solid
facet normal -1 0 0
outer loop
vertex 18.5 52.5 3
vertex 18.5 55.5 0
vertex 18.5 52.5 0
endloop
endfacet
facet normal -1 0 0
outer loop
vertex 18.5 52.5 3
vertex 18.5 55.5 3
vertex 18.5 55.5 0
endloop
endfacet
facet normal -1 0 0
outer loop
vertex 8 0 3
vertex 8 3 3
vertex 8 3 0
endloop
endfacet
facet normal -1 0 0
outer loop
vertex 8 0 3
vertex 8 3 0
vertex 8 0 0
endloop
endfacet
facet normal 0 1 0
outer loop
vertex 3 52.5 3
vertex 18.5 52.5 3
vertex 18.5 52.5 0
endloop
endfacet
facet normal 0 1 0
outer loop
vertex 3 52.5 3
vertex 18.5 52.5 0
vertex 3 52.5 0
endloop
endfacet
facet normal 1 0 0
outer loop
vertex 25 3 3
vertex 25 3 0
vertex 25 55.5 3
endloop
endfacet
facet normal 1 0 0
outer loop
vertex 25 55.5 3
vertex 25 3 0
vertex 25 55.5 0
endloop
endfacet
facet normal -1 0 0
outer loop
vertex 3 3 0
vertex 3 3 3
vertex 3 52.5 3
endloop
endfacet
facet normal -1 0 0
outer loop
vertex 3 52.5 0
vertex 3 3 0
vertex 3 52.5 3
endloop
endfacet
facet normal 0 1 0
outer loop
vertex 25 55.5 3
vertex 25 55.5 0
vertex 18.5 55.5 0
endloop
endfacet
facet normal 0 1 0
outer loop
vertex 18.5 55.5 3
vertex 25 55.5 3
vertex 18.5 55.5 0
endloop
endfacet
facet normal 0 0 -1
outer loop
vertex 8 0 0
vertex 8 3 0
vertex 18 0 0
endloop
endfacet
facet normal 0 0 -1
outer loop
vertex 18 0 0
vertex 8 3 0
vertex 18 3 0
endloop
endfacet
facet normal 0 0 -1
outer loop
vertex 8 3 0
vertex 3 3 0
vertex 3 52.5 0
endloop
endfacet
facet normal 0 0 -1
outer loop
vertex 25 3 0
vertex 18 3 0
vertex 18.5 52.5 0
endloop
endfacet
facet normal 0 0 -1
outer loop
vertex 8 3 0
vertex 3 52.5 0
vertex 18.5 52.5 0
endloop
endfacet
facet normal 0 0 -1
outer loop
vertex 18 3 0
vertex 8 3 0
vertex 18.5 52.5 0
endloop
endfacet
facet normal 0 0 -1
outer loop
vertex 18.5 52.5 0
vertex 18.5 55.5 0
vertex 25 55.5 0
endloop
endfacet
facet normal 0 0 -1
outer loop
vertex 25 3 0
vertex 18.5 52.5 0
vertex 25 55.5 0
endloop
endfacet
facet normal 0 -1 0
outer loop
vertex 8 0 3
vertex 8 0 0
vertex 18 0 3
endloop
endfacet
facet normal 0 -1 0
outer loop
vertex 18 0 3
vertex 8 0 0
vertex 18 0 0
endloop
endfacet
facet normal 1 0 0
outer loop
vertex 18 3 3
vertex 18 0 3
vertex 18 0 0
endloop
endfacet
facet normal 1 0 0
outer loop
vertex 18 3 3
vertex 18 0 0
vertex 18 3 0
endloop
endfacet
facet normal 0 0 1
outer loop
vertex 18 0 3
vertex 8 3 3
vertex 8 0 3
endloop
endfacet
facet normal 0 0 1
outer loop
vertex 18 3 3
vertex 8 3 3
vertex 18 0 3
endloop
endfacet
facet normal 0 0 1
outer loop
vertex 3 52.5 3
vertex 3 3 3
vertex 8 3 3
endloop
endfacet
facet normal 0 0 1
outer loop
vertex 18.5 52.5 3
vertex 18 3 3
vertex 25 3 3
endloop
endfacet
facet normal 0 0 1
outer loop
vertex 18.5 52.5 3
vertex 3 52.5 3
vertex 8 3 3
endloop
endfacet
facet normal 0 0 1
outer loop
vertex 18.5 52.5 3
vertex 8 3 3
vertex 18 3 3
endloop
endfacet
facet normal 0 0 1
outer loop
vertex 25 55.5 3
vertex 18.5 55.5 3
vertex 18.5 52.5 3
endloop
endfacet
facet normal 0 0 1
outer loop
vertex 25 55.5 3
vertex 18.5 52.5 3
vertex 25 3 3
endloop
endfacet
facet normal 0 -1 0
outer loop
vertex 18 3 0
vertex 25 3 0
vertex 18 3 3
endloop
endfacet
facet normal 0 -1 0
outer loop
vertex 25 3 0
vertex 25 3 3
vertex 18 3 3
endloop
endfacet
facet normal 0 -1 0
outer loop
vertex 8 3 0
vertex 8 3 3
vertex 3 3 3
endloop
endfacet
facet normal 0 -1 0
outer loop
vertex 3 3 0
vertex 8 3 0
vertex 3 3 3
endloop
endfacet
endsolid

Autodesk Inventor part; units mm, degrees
ref_plane "YZ Plane" through (0, 0, 0) normal (1, 0, 0) x (0, 1, 0)
ref_plane "XZ Plane" through (0, 0, 0) normal (0, 1, 0) x (-1, 0, 0)
ref_plane "XY Plane" through (0, 0, 0) normal (0, 0, 1) x (1, 0, 0)
sketch "Sketch1" plane through (0, 0, 0) normal (0, 0, 1) x (1, 0, 0)
  line L0 (0, 0) -> (25, 0)
  line L1 (25, 0) -> (25, 55.5)
  line L2 (25, 55.5) -> (0, 55.5)
  line L3 (0, 55.5) -> (0, 0)
  dimension "d0" = 25
  dimension "d1" = 55.5
extrude "Extrusion1" add sketch "Sketch1" along normal blind 3
sketch "Sketch2" plane through (0, 0, 3) normal (0, 0, 1) x (1, 0, 0)
  line L0 (0, 55.5) -> (0, 0) projected
  line L1 (25, 55.5) -> (0, 55.5) projected
  line L2 (0, 0) -> (3, 0)
  line L3 (3, 0) -> (3, 55.5)
  line L4 (3, 55.5) -> (0, 55.5)
  line L5 (0, 55.5) -> (0, 0)
  dimension "d4" = 3
extrude "Extrusion2" cut sketch "Sketch2" against normal through all
sketch "Sketch3" plane through (0, 0, 3) normal (0, 0, 1) x (1, 0, 0)
  point P0 (0, 0)
sketch "Sketch4" plane through (0, 0, 3) normal (0, 0, 1) x (1, 0, 0)
  line L0 (25, 55.5) -> (3, 55.5) projected
  line L1 (3, 55.5) -> (18.5, 55.5)
  line L2 (18.5, 55.5) -> (18.5, 22.5)
  line L3 (18.5, 22.5) -> (3, 22.5)
  line L4 (3, 22.5) -> (3, 55.5)
  point P0 (0, 0)
  dimension "d7" = 15.5
  dimension "d8" = 33
sketch "Sketch5" plane through (0, 0, 3) normal (0, 0, 1) x (1, 0, 0)
  line L0 (3, 0) -> (25, 0) projected
  line L1 (8, 0) -> (18, 0)
  line L2 (18, 0) -> (18, 3)
  line L3 (18, 3) -> (8, 3)
  line L4 (8, 3) -> (8, 0)
  line L5 (3, 55.5) -> (3, 0) projected
  line L6 (3, 0) -> (8, 0)
  line L7 (8, 0) -> (8, 3)
  line L8 (8, 3) -> (3, 3)
  line L9 (3, 3) -> (3, 0)
  line L10 (18, 0) -> (25, 0)
  line L11 (25, 0) -> (25, 3)
  line L12 (25, 3) -> (18, 3)
  line L13 (18, 3) -> (18, 0)
  point P0 (0, 0)
  point P1 (3, 22.5)
  dimension "d11" = 10
  dimension "d12" = 3
  dimension "d13" = 5
extrude "Extrusion4" cut sketch "Sketch5" against normal through all contours L5 L8 L4 L0 | L2 L12 L11 L0
sketch "Sketch6" plane through (0, 0, 3) normal (0, 0, 1) x (1, 0, 0)
  line L0 (25, 55.5) -> (3, 55.5) projected
  line L1 (3, 55.5) -> (18.5, 55.5)
  line L2 (18.5, 55.5) -> (18.5, 52.5)
  line L3 (18.5, 52.5) -> (3, 52.5)
  line L4 (3, 52.5) -> (3, 55.5)
  line L5 (18.5, 55.5) -> (18.5, 22.5) projected
  point P0 (0, 0)
  dimension "d16" = 3
extrude "Extrusion5" cut sketch "Sketch6" against normal through all
properties part number "hollow_mount"
